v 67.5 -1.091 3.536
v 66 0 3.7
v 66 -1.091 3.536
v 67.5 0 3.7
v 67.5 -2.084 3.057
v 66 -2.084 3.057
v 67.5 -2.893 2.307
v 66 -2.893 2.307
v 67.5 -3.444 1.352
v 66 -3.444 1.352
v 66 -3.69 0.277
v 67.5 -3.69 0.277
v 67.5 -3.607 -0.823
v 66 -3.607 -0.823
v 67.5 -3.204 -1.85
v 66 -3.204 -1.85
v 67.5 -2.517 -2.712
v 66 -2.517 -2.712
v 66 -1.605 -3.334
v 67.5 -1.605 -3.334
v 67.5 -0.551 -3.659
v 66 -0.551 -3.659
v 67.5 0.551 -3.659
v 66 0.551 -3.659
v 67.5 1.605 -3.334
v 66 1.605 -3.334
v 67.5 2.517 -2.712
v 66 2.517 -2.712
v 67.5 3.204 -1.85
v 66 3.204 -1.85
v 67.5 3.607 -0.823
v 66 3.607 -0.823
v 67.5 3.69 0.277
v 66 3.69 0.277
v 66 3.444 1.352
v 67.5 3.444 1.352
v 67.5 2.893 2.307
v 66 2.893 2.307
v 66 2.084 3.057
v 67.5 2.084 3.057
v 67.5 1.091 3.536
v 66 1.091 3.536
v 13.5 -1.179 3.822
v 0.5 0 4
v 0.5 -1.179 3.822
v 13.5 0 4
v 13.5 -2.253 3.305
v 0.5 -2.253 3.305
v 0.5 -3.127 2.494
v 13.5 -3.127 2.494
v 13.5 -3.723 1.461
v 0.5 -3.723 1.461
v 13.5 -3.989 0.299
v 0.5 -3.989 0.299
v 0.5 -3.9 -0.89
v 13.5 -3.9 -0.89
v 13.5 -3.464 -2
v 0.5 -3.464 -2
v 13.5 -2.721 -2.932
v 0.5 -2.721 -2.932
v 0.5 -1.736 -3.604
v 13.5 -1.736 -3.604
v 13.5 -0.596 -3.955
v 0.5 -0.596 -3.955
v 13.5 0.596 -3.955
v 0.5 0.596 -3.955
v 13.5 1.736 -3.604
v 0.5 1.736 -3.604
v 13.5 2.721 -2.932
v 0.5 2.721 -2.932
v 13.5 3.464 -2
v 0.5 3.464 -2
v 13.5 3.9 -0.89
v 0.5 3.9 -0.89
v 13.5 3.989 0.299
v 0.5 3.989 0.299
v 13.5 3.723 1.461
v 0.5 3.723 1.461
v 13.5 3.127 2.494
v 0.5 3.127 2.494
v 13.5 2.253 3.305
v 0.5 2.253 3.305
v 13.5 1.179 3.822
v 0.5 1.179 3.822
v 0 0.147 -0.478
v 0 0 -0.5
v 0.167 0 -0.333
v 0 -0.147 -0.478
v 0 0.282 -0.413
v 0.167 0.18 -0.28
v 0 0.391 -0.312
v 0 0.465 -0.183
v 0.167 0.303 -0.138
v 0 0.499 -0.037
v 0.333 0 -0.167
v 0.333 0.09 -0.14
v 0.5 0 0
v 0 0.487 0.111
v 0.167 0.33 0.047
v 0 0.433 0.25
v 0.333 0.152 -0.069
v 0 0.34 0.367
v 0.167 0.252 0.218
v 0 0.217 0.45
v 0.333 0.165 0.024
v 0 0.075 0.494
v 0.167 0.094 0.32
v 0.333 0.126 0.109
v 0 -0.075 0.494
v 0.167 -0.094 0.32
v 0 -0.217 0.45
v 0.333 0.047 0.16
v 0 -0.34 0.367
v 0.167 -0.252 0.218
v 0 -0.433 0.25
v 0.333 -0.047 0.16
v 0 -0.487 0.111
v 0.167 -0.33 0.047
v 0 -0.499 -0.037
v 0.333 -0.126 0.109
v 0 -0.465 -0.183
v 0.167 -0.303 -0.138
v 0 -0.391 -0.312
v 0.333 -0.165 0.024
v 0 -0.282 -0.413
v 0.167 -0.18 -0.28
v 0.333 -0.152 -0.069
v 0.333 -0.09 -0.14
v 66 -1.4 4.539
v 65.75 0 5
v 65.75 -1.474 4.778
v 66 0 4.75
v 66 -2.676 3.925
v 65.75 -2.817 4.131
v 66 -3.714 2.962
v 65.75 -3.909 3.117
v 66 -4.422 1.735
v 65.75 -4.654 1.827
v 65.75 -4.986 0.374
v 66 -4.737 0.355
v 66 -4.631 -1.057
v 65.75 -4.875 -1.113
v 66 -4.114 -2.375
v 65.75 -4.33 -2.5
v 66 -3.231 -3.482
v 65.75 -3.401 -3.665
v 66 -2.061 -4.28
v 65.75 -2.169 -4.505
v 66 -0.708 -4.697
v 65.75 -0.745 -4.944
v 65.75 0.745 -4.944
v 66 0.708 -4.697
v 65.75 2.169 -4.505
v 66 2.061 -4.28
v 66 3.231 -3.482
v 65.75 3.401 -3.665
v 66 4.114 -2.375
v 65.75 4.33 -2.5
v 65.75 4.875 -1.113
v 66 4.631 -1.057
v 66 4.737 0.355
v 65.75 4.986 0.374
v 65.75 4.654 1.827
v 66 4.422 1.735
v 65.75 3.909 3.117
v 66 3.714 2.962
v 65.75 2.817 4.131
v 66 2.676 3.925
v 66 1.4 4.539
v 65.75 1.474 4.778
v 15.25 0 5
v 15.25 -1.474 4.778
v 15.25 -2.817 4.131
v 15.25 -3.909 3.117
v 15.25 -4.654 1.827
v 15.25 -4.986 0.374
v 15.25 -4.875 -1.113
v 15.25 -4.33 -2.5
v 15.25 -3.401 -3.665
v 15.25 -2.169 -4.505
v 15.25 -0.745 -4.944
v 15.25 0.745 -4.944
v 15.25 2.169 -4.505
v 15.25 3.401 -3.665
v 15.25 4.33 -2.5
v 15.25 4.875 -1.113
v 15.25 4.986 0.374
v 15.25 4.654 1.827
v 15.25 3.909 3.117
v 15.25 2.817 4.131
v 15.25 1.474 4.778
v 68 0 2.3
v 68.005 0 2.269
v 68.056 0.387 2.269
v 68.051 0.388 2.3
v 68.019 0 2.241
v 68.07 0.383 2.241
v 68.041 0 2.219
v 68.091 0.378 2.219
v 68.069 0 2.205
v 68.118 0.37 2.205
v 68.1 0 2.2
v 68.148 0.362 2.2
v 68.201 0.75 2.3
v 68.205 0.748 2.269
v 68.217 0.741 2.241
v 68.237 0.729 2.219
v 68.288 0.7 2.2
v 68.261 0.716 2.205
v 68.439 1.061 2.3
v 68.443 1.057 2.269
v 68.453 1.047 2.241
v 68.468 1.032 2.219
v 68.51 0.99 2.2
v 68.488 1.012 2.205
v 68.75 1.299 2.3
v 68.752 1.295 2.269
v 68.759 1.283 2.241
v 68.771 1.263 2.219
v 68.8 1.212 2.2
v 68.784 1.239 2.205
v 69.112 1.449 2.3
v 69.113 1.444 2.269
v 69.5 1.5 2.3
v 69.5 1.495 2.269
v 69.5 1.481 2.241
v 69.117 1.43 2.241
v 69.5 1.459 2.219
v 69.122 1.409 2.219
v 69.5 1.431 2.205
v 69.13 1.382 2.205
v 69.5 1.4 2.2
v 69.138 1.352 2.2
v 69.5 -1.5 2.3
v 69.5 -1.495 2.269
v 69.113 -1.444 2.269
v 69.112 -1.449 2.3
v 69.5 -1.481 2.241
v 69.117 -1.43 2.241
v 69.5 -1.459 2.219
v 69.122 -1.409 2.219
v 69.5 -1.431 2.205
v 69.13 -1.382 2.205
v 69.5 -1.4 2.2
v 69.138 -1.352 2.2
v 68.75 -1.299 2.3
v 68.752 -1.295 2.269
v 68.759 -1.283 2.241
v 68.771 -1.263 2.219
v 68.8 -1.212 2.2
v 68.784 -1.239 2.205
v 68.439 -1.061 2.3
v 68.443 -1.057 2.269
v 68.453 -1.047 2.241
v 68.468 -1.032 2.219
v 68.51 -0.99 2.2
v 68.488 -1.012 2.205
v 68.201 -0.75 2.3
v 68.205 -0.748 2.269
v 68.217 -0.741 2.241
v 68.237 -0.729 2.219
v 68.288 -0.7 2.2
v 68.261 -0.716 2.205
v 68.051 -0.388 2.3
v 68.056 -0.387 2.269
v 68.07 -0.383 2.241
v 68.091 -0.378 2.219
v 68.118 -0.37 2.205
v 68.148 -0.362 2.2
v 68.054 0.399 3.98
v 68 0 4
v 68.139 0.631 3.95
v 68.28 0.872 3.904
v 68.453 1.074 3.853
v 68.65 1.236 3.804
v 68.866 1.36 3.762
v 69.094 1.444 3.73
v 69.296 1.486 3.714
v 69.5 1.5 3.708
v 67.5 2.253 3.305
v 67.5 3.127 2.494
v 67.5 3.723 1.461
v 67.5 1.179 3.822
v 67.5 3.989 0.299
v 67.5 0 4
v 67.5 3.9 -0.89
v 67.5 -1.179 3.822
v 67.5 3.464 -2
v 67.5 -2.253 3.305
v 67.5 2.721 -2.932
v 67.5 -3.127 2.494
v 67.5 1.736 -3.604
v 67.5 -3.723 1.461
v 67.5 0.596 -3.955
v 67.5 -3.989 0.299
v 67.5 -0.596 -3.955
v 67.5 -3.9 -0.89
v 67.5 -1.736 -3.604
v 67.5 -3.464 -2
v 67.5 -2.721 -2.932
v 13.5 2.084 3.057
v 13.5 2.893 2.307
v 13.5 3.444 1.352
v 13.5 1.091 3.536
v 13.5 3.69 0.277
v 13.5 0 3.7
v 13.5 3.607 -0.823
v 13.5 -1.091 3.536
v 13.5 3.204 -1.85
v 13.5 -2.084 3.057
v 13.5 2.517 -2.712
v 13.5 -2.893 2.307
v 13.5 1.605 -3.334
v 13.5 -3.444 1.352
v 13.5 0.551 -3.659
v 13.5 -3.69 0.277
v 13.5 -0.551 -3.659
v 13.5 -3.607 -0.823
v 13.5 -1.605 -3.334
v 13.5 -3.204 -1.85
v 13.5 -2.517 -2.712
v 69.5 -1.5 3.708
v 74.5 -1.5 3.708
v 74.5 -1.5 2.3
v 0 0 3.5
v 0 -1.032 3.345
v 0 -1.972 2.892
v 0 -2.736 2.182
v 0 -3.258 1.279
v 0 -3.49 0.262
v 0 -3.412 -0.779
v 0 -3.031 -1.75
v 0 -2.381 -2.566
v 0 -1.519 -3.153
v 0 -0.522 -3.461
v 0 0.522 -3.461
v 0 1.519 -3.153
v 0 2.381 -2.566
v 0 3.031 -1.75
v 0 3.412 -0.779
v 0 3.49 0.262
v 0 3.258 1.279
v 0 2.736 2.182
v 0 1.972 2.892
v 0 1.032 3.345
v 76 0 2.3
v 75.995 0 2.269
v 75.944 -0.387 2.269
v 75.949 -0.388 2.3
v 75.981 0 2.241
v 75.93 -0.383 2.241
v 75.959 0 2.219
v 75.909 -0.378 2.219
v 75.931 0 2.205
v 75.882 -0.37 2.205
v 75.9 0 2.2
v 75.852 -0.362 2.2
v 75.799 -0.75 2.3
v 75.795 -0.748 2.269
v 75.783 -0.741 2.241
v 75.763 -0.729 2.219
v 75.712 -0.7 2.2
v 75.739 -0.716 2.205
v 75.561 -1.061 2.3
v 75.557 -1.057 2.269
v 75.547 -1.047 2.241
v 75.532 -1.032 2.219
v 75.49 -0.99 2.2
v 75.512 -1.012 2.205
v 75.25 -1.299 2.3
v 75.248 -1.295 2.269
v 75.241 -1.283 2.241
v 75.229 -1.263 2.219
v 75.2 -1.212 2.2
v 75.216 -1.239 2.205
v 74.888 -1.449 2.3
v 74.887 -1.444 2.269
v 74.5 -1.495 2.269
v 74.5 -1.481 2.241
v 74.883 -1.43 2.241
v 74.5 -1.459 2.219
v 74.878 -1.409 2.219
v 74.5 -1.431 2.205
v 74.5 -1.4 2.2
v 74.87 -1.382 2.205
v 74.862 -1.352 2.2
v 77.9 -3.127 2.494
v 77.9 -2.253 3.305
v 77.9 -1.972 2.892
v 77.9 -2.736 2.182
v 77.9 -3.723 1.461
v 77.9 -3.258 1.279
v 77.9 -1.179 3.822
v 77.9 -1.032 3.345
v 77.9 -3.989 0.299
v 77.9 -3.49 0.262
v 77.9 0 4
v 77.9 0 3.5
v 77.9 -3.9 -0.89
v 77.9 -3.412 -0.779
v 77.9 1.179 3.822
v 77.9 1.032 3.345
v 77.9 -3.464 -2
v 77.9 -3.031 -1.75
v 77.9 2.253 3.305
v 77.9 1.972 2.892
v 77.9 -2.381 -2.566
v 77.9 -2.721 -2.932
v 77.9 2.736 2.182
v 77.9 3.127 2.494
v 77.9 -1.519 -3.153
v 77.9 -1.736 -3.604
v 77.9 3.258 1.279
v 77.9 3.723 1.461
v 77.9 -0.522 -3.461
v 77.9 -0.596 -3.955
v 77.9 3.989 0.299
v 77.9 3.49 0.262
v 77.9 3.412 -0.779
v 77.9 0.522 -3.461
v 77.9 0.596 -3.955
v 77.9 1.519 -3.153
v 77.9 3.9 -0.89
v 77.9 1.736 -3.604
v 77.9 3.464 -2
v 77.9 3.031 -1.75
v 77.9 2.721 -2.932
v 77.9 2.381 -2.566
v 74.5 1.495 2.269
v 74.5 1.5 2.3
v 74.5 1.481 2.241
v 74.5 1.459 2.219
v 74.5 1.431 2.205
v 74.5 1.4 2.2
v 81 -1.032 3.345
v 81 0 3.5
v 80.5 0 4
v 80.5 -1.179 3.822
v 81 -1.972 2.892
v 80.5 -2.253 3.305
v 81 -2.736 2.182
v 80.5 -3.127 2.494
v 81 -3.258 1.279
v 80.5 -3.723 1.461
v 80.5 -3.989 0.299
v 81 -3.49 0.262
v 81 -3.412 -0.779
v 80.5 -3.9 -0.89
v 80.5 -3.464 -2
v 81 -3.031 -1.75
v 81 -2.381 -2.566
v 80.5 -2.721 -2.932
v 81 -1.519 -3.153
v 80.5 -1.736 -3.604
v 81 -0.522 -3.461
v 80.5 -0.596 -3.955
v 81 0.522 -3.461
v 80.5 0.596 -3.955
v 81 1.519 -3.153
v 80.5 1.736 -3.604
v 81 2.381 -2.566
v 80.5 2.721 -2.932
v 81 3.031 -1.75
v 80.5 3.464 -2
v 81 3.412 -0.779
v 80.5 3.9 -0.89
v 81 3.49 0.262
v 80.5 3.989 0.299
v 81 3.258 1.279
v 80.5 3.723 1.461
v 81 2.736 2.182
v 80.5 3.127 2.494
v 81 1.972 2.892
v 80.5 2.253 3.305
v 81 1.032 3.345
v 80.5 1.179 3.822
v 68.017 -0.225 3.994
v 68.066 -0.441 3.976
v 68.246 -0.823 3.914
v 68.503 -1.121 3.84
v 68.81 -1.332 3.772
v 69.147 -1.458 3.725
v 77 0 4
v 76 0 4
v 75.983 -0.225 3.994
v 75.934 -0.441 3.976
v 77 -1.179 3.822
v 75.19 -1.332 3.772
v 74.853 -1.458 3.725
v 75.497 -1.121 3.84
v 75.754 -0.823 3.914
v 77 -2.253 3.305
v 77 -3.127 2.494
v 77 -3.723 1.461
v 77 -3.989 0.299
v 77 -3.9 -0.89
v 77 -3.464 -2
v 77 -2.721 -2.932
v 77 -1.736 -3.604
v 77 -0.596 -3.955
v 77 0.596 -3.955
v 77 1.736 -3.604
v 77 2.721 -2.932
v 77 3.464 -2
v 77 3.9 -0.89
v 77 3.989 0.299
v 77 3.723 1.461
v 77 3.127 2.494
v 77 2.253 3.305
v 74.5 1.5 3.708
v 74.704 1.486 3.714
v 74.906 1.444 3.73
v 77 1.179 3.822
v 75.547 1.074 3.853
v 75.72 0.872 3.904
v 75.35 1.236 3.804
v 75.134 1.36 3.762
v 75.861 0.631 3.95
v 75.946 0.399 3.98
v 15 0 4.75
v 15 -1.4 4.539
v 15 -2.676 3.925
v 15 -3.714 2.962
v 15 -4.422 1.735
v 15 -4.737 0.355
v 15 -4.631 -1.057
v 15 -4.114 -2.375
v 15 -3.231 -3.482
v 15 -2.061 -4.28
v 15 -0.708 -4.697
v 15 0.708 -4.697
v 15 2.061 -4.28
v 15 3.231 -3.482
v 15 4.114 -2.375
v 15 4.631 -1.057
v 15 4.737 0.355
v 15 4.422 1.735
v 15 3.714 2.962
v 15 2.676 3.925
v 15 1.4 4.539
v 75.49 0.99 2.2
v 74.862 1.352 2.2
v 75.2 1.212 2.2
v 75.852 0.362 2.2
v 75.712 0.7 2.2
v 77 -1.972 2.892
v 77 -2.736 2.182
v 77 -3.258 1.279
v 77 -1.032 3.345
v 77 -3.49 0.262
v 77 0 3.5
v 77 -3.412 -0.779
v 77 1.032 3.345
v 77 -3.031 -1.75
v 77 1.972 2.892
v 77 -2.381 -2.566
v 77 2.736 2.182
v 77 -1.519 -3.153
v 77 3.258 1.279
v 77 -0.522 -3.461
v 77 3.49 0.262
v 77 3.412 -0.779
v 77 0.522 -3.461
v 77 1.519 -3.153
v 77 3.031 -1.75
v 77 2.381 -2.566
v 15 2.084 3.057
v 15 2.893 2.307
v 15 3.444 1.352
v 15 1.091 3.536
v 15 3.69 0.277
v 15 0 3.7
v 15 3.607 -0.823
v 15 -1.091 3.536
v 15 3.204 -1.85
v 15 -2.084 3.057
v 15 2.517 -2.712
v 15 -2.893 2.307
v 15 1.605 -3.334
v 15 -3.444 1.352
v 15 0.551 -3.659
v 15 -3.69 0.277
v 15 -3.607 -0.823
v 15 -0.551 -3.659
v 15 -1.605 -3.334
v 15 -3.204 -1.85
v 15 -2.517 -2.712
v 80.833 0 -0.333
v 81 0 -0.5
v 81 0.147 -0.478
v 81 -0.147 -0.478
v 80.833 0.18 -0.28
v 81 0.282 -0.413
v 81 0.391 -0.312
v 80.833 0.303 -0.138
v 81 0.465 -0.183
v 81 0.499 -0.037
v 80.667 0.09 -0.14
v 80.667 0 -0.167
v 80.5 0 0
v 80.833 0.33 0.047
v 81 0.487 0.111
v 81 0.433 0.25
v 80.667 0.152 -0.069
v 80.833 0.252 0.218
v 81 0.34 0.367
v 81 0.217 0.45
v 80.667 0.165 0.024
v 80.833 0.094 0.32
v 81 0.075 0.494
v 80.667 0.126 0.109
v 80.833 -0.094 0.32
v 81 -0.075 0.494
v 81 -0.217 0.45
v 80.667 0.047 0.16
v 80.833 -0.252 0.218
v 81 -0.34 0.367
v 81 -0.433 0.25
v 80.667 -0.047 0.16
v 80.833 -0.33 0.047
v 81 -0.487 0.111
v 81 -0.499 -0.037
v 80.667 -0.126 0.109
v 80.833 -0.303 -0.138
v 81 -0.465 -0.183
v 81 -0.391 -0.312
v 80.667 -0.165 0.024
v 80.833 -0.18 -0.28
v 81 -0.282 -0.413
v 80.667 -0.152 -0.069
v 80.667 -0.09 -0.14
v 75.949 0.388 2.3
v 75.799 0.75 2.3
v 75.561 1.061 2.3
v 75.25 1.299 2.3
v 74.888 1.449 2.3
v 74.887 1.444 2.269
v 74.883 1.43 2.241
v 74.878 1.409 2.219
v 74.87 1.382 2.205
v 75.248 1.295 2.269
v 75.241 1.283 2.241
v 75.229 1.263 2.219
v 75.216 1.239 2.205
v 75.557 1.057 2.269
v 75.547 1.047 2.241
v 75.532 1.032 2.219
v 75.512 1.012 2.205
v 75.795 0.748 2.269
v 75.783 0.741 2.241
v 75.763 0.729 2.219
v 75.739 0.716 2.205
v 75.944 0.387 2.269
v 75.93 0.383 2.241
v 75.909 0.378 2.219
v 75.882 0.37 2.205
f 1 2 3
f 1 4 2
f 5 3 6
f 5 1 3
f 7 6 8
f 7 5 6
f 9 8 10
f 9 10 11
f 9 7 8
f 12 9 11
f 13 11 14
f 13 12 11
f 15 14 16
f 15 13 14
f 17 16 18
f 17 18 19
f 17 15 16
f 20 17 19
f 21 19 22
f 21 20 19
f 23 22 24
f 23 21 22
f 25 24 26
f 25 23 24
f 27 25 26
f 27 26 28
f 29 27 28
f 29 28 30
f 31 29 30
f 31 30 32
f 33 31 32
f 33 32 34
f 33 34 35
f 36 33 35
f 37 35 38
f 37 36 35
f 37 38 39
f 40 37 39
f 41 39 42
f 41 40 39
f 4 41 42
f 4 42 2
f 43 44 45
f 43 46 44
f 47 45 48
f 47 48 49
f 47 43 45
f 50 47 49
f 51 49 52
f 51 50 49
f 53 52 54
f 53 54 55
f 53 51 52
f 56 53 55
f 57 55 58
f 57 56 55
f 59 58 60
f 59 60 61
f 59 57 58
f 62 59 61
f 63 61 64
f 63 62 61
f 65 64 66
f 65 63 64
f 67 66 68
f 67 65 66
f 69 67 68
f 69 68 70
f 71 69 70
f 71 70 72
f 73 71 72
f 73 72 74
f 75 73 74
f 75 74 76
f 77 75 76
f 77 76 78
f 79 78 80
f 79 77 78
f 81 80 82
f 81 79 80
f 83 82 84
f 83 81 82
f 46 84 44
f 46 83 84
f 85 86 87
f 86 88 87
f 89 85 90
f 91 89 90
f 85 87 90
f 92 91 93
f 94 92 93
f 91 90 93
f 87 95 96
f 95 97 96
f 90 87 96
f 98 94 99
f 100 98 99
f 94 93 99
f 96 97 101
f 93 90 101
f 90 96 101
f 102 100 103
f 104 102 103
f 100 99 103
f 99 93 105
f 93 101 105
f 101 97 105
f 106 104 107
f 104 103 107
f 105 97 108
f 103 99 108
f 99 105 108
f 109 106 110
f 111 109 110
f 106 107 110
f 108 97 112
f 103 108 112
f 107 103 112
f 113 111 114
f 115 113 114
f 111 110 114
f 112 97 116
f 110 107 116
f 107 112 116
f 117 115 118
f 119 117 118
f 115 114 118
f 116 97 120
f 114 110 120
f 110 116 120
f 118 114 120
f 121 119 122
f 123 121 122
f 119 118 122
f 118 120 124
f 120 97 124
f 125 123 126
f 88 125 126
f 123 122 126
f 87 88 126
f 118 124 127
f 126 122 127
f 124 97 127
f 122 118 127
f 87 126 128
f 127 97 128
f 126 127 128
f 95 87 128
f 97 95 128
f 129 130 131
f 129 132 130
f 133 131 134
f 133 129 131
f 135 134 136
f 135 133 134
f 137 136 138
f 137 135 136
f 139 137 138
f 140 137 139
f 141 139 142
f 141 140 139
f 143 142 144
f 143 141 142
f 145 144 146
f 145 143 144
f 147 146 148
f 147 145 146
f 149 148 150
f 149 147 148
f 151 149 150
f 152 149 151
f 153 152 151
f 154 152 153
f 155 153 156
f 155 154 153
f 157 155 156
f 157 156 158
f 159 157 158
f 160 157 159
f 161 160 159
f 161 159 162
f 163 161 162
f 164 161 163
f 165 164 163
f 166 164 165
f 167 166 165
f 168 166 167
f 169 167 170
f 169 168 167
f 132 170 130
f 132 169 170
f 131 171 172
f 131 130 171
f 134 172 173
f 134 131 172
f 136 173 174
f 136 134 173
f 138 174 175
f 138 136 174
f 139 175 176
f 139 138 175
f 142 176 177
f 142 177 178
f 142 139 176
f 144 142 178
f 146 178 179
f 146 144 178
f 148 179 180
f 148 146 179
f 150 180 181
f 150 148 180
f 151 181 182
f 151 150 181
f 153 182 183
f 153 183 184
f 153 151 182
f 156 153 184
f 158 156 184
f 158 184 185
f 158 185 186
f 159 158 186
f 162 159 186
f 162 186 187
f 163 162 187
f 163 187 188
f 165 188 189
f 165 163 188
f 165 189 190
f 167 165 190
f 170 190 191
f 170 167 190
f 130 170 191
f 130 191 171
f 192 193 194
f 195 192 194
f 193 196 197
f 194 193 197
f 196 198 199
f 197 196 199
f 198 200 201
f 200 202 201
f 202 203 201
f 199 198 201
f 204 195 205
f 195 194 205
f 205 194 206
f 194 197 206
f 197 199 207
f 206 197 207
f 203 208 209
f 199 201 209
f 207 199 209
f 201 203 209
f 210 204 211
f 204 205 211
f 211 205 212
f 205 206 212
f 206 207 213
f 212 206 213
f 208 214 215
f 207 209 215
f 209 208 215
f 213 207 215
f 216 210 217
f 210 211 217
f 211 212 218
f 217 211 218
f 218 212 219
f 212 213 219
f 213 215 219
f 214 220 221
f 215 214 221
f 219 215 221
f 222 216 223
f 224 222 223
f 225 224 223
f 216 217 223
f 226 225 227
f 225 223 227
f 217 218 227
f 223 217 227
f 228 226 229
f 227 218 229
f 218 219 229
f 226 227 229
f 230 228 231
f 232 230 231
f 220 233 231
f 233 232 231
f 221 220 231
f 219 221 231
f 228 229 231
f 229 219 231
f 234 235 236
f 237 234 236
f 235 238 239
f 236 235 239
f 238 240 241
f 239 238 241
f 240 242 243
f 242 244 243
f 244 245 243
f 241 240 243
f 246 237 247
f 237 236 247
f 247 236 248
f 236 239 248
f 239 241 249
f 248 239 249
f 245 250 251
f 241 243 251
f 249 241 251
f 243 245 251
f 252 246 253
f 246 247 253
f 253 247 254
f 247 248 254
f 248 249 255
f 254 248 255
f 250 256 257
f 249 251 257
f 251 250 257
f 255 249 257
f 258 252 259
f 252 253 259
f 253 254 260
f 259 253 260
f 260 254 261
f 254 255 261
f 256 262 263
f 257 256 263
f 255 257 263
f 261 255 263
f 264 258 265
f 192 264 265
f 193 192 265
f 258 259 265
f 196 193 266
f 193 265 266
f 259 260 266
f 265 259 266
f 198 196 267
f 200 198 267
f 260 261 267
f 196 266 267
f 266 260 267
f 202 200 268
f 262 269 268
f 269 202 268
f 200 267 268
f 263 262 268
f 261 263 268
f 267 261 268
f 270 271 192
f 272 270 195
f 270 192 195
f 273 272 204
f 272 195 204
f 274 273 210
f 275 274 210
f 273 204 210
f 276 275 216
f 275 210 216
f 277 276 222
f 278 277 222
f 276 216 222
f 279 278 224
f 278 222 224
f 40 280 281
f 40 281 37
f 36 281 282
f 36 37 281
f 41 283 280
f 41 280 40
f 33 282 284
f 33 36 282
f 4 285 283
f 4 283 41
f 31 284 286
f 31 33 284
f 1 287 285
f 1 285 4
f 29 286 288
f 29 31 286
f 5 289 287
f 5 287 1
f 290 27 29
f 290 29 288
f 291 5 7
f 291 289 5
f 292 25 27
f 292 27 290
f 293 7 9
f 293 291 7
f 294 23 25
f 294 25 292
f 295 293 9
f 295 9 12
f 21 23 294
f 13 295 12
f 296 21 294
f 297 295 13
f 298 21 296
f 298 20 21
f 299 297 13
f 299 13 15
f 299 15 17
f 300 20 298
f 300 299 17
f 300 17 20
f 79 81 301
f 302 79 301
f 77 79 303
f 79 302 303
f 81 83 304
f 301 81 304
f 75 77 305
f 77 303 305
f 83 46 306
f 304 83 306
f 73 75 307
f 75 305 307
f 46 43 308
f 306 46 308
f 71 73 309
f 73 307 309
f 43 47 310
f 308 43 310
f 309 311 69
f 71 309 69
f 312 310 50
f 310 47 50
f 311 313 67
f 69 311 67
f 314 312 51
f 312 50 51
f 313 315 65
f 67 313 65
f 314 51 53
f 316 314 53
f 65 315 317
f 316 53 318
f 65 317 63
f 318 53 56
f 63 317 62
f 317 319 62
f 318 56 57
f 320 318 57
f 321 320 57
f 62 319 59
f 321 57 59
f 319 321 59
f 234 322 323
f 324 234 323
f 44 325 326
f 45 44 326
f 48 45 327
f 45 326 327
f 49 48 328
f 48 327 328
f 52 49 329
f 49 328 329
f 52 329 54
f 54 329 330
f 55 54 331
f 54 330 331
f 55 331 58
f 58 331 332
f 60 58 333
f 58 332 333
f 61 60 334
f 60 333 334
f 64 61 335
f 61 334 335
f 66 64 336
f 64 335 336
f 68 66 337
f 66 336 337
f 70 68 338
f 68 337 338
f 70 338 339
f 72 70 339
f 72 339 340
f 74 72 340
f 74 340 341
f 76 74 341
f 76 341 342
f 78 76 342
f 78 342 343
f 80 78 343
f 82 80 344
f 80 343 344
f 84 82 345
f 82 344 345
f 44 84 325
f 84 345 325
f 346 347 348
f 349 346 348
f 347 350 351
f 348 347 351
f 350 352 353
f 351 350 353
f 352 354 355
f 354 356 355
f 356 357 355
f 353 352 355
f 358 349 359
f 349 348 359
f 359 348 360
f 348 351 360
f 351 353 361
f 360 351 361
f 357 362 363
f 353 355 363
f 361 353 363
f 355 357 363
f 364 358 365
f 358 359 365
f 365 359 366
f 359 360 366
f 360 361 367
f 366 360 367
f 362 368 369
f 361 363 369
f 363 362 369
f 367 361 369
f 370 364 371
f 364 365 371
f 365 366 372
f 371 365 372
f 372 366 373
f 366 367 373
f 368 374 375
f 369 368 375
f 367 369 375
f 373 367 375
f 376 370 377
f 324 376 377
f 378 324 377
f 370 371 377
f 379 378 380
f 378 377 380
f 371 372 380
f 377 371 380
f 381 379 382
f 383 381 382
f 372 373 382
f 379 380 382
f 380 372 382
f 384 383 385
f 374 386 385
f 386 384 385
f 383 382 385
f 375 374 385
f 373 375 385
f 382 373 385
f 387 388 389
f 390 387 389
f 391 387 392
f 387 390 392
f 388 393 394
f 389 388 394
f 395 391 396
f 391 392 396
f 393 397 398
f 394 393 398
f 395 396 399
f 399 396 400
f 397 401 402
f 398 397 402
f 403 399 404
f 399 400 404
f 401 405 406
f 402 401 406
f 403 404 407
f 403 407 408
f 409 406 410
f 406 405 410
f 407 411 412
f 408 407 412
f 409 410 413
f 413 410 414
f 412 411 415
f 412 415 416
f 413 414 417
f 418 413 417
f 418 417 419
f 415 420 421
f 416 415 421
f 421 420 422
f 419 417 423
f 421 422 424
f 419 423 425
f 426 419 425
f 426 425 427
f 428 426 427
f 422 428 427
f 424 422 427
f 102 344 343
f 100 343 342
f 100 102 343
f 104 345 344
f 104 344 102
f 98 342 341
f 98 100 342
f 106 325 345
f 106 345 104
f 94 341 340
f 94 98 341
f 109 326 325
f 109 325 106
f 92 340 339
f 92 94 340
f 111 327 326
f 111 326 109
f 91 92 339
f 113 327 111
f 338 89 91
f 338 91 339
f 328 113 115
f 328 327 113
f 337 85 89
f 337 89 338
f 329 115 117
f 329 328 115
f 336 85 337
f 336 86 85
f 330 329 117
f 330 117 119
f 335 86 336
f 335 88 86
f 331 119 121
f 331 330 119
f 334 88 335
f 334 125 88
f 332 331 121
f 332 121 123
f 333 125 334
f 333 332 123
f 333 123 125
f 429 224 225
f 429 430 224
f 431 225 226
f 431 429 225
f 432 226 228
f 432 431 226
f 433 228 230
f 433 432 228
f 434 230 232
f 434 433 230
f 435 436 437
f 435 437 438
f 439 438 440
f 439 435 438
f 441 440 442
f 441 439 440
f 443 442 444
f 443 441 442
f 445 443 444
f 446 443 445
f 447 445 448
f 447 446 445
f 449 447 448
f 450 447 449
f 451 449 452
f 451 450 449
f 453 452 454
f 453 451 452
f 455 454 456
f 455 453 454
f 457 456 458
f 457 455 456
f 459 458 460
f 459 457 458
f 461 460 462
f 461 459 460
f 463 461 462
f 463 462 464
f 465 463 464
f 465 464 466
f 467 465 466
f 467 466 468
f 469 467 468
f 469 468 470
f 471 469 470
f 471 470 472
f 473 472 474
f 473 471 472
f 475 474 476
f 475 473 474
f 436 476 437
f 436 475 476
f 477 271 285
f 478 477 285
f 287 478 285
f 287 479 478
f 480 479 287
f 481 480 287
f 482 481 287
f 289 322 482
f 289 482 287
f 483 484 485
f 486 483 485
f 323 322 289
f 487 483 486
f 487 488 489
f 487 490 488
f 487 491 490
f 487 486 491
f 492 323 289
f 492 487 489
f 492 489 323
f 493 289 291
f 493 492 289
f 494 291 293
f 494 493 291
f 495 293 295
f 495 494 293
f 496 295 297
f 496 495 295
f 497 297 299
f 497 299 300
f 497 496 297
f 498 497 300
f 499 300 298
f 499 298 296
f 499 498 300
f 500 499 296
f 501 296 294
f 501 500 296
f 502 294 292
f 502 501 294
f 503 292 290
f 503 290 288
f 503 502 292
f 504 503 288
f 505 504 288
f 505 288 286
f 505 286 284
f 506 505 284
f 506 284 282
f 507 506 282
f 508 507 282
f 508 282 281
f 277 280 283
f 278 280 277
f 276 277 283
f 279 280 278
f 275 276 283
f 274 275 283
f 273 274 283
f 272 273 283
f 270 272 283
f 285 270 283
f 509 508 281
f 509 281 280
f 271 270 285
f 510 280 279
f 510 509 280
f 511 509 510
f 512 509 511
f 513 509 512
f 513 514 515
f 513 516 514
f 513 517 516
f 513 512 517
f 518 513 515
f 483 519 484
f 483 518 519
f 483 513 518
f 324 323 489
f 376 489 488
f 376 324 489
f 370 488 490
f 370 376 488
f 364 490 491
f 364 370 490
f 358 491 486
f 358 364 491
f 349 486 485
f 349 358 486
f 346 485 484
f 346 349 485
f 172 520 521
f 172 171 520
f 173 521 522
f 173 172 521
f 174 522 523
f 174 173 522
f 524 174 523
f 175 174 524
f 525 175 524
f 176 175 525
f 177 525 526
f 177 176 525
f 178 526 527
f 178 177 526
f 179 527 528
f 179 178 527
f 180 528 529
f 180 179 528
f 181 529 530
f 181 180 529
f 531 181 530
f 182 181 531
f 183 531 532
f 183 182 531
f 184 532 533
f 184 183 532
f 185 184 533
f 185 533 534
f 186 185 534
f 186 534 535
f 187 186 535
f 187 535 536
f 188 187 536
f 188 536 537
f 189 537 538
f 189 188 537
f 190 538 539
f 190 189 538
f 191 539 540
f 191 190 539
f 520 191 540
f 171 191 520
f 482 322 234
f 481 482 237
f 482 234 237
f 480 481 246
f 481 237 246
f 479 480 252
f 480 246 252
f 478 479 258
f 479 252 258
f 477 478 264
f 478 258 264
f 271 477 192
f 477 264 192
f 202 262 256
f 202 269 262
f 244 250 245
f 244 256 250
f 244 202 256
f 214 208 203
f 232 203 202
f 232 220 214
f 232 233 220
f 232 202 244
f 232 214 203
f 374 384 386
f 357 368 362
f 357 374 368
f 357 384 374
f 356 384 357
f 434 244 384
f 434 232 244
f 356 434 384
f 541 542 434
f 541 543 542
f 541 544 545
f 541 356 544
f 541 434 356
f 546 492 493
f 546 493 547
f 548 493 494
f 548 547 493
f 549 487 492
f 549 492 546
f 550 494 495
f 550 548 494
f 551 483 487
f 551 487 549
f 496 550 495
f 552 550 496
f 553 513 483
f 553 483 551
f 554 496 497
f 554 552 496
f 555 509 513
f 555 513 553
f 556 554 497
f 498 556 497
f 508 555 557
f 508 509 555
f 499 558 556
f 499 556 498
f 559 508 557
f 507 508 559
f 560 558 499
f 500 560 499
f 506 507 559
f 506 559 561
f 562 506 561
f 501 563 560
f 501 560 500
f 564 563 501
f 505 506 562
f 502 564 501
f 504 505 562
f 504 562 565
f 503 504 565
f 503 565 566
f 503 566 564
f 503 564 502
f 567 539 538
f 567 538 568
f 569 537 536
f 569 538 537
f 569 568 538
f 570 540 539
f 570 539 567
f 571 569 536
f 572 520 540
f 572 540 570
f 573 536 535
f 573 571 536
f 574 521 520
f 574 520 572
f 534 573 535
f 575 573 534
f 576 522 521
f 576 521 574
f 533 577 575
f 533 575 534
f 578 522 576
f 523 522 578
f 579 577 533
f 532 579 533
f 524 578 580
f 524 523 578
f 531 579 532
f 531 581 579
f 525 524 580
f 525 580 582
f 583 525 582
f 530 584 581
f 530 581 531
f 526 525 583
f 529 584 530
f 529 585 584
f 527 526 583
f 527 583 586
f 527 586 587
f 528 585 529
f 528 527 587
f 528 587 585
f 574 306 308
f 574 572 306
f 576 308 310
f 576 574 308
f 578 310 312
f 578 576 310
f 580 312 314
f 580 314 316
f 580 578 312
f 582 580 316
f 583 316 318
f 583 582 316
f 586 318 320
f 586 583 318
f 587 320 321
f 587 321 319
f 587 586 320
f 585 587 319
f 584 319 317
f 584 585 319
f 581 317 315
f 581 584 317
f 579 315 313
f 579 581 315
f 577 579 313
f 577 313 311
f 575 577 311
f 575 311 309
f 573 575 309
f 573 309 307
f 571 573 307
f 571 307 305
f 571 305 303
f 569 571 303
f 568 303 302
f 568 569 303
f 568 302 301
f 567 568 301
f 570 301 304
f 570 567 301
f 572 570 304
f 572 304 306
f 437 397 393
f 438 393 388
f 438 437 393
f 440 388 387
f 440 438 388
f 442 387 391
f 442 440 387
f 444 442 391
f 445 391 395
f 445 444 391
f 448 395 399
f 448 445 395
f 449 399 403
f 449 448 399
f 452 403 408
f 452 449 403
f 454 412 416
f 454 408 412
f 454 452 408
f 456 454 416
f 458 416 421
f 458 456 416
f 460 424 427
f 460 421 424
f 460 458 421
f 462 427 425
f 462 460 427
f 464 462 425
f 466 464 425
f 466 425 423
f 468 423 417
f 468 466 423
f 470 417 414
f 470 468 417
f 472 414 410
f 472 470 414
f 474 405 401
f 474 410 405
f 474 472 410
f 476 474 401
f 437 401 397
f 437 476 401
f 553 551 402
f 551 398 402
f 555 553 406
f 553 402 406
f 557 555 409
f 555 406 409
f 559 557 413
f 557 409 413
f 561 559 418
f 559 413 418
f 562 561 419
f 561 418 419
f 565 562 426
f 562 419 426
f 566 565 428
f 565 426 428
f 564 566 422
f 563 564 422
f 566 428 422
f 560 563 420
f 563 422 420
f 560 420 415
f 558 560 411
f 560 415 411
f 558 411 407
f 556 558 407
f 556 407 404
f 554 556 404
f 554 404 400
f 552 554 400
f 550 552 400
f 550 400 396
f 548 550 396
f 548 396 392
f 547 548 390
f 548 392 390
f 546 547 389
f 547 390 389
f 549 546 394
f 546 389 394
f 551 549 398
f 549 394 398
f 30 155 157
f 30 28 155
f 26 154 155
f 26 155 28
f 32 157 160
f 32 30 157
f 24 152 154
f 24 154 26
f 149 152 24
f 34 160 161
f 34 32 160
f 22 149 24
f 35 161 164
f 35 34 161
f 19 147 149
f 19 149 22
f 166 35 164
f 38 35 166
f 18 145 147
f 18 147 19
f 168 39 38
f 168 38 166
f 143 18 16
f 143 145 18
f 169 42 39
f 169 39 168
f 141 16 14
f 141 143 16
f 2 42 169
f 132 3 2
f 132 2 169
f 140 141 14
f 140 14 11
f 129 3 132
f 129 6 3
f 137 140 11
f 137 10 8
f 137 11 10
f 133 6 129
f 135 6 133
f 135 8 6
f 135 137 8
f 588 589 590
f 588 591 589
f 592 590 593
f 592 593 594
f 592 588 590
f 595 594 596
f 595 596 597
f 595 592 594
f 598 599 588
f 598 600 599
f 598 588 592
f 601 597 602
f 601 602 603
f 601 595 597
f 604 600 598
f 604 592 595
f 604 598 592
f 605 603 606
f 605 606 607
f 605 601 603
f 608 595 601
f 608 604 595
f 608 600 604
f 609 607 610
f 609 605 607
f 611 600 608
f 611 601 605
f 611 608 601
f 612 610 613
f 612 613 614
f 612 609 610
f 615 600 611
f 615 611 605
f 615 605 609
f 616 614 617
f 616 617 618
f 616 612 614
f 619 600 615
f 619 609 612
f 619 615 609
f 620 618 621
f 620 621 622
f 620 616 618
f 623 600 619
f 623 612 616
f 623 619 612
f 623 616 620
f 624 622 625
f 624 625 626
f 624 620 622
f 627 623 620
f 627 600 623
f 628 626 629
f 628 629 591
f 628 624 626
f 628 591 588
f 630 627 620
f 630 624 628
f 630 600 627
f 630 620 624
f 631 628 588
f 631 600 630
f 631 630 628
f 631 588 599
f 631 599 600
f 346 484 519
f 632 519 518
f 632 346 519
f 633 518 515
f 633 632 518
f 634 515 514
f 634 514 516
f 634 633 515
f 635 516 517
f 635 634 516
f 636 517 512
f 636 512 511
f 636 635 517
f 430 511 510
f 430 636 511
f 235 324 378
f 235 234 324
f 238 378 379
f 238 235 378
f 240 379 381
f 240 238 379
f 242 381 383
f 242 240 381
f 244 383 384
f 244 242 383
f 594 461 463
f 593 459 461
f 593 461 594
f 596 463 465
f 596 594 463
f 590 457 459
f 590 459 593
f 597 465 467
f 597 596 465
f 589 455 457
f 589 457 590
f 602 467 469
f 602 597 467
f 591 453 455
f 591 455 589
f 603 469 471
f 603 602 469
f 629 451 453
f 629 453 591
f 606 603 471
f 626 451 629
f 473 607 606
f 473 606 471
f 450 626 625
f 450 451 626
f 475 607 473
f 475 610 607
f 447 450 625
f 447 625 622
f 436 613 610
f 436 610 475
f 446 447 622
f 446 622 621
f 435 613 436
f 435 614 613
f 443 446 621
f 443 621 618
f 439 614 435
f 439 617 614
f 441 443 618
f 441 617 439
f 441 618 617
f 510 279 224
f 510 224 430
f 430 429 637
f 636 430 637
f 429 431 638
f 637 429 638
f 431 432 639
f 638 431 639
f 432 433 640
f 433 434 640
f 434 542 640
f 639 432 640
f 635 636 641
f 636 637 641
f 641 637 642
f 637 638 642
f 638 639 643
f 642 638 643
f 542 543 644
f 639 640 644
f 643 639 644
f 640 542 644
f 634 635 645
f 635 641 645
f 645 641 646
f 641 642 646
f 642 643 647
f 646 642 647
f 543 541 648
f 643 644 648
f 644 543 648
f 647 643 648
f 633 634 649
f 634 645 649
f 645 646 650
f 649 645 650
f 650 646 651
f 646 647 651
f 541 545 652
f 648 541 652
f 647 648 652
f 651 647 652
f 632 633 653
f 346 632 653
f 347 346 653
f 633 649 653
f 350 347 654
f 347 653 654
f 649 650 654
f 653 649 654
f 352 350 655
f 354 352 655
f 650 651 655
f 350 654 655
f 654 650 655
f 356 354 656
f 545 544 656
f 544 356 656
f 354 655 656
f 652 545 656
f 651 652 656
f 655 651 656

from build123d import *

# Parameters (mm, degrees)
CHAMFER1_SIZE      = 0.5
SKETCH3_W          = 1.5
SKETCH3_H          = 0.3
SKETCH17_W         = 8
SKETCH17_H         = 3
CUT_EXTRUDE4_DEPTH = 1.8
FILLET10_R         = 1.5
FILLET11_R         = 1.5
FILLET12_R         = 0.1
SKETCH29_W         = 0.9
SKETCH29_H         = 0.5


with BuildPart() as part:
    # Sketch1 → Revolve1 (revolve)
    with BuildSketch(Plane.XY, mode=Mode.PRIVATE) as revolve1_sk:
        Polygon((0, 4), (15, 4), (15, 4.75), (15.25, 5), (65.75, 5), (66, 4.75), (66, 4), (81, 4), (81, 0), (0, 0), align=None)
    revolve(revolve1_sk.sketch.rotate(Axis((0, 0, 0), (1, 0, 0)), 90), axis=Axis((0, 0, 0), (1, 0, 0)))

    # Chamfer1
    chamfer1_edges = [part.edges().sort_by_distance(p)[0] for p in [
        (81, 0, -4),
        (0, 0, -4),
    ]]
    chamfer(chamfer1_edges, length=CHAMFER1_SIZE)

    # Sketch2 → Cut-Revolve1 (revolve, cut)
    with BuildSketch(Plane.XY, mode=Mode.PRIVATE) as cut_revolve1_sk:
        Polygon((0, 0.5), (0.5, 0), (0, 0), align=None)
        Polygon((81, 0), (81, 0.5), (80.5, 0), align=None)
    revolve(cut_revolve1_sk.sketch.rotate(Axis((0, 0, 0), (1, 0, 0)), 270), axis=Axis((0, 0, 0), (1, 0, 0)), mode=Mode.SUBTRACT)

    # Sketch3 → Cut-Revolve2 (revolve, cut)
    with BuildSketch(Plane.XY, mode=Mode.PRIVATE) as cut_revolve2_sk:
        with Locations((14.25, 3.85)):
            Rectangle(SKETCH3_W, SKETCH3_H)
        with Locations((66.75, 3.85)):
            Rectangle(SKETCH3_W, SKETCH3_H)
    revolve(cut_revolve2_sk.sketch.rotate(Axis((0, 0, 0), (1, 0, 0)), 90), axis=Axis((0, 0, 0), (1, 0, 0)), mode=Mode.SUBTRACT)

    # Sketch17 → Cut-Extrude4 (cut)
    with BuildSketch(Plane.XY.offset(4)):
        with Locations((72, 0)):
            Rectangle(SKETCH17_W, SKETCH17_H)
    extrude(amount=-CUT_EXTRUDE4_DEPTH, mode=Mode.SUBTRACT)

    # Fillet10
    fillet10_edges = [part.edges().sort_by_distance(p)[0] for p in [
        (76, 1.5, 2.954049622),
        (76, -1.5, 2.954049622),
    ]]
    fillet(fillet10_edges, radius=FILLET10_R - 0.0001)  # a hair under: the kernel refuses the full size

    # Fillet11
    fillet11_edges = [part.edges().sort_by_distance(p)[0] for p in [
        (68, 1.5, 2.954049622),
        (68, -1.5, 2.954049622),
    ]]
    fillet(fillet11_edges, radius=FILLET11_R - 0.0001)  # a hair under: the kernel refuses the full size

    # Fillet12
    fillet12_edges = [part.edges().sort_by_distance(p)[0] for p in [
        (72, 1.5, 2.2),
        (75.560689461, -1.060689461, 2.2),
        (75.560689461, 1.060689461, 2.2),
        (72, -1.5, 2.2),
        (68.439310539, -1.060689461, 2.2),
        (68.439310539, 1.060689461, 2.2),
    ]]
    fillet(fillet12_edges, radius=FILLET12_R)

    # Sketch29 → Cut-Revolve6 (revolve, cut)
    with BuildSketch(Plane.XY, mode=Mode.PRIVATE) as cut_revolve6_sk:
        with Locations((77.45, 3.75)):
            Rectangle(SKETCH29_W, SKETCH29_H)
    revolve(cut_revolve6_sk.sketch.rotate(Axis((81, 0, 0), (-1, 0, 0)), 270), axis=Axis((81, 0, 0), (-1, 0, 0)), mode=Mode.SUBTRACT)


solid = part.part
